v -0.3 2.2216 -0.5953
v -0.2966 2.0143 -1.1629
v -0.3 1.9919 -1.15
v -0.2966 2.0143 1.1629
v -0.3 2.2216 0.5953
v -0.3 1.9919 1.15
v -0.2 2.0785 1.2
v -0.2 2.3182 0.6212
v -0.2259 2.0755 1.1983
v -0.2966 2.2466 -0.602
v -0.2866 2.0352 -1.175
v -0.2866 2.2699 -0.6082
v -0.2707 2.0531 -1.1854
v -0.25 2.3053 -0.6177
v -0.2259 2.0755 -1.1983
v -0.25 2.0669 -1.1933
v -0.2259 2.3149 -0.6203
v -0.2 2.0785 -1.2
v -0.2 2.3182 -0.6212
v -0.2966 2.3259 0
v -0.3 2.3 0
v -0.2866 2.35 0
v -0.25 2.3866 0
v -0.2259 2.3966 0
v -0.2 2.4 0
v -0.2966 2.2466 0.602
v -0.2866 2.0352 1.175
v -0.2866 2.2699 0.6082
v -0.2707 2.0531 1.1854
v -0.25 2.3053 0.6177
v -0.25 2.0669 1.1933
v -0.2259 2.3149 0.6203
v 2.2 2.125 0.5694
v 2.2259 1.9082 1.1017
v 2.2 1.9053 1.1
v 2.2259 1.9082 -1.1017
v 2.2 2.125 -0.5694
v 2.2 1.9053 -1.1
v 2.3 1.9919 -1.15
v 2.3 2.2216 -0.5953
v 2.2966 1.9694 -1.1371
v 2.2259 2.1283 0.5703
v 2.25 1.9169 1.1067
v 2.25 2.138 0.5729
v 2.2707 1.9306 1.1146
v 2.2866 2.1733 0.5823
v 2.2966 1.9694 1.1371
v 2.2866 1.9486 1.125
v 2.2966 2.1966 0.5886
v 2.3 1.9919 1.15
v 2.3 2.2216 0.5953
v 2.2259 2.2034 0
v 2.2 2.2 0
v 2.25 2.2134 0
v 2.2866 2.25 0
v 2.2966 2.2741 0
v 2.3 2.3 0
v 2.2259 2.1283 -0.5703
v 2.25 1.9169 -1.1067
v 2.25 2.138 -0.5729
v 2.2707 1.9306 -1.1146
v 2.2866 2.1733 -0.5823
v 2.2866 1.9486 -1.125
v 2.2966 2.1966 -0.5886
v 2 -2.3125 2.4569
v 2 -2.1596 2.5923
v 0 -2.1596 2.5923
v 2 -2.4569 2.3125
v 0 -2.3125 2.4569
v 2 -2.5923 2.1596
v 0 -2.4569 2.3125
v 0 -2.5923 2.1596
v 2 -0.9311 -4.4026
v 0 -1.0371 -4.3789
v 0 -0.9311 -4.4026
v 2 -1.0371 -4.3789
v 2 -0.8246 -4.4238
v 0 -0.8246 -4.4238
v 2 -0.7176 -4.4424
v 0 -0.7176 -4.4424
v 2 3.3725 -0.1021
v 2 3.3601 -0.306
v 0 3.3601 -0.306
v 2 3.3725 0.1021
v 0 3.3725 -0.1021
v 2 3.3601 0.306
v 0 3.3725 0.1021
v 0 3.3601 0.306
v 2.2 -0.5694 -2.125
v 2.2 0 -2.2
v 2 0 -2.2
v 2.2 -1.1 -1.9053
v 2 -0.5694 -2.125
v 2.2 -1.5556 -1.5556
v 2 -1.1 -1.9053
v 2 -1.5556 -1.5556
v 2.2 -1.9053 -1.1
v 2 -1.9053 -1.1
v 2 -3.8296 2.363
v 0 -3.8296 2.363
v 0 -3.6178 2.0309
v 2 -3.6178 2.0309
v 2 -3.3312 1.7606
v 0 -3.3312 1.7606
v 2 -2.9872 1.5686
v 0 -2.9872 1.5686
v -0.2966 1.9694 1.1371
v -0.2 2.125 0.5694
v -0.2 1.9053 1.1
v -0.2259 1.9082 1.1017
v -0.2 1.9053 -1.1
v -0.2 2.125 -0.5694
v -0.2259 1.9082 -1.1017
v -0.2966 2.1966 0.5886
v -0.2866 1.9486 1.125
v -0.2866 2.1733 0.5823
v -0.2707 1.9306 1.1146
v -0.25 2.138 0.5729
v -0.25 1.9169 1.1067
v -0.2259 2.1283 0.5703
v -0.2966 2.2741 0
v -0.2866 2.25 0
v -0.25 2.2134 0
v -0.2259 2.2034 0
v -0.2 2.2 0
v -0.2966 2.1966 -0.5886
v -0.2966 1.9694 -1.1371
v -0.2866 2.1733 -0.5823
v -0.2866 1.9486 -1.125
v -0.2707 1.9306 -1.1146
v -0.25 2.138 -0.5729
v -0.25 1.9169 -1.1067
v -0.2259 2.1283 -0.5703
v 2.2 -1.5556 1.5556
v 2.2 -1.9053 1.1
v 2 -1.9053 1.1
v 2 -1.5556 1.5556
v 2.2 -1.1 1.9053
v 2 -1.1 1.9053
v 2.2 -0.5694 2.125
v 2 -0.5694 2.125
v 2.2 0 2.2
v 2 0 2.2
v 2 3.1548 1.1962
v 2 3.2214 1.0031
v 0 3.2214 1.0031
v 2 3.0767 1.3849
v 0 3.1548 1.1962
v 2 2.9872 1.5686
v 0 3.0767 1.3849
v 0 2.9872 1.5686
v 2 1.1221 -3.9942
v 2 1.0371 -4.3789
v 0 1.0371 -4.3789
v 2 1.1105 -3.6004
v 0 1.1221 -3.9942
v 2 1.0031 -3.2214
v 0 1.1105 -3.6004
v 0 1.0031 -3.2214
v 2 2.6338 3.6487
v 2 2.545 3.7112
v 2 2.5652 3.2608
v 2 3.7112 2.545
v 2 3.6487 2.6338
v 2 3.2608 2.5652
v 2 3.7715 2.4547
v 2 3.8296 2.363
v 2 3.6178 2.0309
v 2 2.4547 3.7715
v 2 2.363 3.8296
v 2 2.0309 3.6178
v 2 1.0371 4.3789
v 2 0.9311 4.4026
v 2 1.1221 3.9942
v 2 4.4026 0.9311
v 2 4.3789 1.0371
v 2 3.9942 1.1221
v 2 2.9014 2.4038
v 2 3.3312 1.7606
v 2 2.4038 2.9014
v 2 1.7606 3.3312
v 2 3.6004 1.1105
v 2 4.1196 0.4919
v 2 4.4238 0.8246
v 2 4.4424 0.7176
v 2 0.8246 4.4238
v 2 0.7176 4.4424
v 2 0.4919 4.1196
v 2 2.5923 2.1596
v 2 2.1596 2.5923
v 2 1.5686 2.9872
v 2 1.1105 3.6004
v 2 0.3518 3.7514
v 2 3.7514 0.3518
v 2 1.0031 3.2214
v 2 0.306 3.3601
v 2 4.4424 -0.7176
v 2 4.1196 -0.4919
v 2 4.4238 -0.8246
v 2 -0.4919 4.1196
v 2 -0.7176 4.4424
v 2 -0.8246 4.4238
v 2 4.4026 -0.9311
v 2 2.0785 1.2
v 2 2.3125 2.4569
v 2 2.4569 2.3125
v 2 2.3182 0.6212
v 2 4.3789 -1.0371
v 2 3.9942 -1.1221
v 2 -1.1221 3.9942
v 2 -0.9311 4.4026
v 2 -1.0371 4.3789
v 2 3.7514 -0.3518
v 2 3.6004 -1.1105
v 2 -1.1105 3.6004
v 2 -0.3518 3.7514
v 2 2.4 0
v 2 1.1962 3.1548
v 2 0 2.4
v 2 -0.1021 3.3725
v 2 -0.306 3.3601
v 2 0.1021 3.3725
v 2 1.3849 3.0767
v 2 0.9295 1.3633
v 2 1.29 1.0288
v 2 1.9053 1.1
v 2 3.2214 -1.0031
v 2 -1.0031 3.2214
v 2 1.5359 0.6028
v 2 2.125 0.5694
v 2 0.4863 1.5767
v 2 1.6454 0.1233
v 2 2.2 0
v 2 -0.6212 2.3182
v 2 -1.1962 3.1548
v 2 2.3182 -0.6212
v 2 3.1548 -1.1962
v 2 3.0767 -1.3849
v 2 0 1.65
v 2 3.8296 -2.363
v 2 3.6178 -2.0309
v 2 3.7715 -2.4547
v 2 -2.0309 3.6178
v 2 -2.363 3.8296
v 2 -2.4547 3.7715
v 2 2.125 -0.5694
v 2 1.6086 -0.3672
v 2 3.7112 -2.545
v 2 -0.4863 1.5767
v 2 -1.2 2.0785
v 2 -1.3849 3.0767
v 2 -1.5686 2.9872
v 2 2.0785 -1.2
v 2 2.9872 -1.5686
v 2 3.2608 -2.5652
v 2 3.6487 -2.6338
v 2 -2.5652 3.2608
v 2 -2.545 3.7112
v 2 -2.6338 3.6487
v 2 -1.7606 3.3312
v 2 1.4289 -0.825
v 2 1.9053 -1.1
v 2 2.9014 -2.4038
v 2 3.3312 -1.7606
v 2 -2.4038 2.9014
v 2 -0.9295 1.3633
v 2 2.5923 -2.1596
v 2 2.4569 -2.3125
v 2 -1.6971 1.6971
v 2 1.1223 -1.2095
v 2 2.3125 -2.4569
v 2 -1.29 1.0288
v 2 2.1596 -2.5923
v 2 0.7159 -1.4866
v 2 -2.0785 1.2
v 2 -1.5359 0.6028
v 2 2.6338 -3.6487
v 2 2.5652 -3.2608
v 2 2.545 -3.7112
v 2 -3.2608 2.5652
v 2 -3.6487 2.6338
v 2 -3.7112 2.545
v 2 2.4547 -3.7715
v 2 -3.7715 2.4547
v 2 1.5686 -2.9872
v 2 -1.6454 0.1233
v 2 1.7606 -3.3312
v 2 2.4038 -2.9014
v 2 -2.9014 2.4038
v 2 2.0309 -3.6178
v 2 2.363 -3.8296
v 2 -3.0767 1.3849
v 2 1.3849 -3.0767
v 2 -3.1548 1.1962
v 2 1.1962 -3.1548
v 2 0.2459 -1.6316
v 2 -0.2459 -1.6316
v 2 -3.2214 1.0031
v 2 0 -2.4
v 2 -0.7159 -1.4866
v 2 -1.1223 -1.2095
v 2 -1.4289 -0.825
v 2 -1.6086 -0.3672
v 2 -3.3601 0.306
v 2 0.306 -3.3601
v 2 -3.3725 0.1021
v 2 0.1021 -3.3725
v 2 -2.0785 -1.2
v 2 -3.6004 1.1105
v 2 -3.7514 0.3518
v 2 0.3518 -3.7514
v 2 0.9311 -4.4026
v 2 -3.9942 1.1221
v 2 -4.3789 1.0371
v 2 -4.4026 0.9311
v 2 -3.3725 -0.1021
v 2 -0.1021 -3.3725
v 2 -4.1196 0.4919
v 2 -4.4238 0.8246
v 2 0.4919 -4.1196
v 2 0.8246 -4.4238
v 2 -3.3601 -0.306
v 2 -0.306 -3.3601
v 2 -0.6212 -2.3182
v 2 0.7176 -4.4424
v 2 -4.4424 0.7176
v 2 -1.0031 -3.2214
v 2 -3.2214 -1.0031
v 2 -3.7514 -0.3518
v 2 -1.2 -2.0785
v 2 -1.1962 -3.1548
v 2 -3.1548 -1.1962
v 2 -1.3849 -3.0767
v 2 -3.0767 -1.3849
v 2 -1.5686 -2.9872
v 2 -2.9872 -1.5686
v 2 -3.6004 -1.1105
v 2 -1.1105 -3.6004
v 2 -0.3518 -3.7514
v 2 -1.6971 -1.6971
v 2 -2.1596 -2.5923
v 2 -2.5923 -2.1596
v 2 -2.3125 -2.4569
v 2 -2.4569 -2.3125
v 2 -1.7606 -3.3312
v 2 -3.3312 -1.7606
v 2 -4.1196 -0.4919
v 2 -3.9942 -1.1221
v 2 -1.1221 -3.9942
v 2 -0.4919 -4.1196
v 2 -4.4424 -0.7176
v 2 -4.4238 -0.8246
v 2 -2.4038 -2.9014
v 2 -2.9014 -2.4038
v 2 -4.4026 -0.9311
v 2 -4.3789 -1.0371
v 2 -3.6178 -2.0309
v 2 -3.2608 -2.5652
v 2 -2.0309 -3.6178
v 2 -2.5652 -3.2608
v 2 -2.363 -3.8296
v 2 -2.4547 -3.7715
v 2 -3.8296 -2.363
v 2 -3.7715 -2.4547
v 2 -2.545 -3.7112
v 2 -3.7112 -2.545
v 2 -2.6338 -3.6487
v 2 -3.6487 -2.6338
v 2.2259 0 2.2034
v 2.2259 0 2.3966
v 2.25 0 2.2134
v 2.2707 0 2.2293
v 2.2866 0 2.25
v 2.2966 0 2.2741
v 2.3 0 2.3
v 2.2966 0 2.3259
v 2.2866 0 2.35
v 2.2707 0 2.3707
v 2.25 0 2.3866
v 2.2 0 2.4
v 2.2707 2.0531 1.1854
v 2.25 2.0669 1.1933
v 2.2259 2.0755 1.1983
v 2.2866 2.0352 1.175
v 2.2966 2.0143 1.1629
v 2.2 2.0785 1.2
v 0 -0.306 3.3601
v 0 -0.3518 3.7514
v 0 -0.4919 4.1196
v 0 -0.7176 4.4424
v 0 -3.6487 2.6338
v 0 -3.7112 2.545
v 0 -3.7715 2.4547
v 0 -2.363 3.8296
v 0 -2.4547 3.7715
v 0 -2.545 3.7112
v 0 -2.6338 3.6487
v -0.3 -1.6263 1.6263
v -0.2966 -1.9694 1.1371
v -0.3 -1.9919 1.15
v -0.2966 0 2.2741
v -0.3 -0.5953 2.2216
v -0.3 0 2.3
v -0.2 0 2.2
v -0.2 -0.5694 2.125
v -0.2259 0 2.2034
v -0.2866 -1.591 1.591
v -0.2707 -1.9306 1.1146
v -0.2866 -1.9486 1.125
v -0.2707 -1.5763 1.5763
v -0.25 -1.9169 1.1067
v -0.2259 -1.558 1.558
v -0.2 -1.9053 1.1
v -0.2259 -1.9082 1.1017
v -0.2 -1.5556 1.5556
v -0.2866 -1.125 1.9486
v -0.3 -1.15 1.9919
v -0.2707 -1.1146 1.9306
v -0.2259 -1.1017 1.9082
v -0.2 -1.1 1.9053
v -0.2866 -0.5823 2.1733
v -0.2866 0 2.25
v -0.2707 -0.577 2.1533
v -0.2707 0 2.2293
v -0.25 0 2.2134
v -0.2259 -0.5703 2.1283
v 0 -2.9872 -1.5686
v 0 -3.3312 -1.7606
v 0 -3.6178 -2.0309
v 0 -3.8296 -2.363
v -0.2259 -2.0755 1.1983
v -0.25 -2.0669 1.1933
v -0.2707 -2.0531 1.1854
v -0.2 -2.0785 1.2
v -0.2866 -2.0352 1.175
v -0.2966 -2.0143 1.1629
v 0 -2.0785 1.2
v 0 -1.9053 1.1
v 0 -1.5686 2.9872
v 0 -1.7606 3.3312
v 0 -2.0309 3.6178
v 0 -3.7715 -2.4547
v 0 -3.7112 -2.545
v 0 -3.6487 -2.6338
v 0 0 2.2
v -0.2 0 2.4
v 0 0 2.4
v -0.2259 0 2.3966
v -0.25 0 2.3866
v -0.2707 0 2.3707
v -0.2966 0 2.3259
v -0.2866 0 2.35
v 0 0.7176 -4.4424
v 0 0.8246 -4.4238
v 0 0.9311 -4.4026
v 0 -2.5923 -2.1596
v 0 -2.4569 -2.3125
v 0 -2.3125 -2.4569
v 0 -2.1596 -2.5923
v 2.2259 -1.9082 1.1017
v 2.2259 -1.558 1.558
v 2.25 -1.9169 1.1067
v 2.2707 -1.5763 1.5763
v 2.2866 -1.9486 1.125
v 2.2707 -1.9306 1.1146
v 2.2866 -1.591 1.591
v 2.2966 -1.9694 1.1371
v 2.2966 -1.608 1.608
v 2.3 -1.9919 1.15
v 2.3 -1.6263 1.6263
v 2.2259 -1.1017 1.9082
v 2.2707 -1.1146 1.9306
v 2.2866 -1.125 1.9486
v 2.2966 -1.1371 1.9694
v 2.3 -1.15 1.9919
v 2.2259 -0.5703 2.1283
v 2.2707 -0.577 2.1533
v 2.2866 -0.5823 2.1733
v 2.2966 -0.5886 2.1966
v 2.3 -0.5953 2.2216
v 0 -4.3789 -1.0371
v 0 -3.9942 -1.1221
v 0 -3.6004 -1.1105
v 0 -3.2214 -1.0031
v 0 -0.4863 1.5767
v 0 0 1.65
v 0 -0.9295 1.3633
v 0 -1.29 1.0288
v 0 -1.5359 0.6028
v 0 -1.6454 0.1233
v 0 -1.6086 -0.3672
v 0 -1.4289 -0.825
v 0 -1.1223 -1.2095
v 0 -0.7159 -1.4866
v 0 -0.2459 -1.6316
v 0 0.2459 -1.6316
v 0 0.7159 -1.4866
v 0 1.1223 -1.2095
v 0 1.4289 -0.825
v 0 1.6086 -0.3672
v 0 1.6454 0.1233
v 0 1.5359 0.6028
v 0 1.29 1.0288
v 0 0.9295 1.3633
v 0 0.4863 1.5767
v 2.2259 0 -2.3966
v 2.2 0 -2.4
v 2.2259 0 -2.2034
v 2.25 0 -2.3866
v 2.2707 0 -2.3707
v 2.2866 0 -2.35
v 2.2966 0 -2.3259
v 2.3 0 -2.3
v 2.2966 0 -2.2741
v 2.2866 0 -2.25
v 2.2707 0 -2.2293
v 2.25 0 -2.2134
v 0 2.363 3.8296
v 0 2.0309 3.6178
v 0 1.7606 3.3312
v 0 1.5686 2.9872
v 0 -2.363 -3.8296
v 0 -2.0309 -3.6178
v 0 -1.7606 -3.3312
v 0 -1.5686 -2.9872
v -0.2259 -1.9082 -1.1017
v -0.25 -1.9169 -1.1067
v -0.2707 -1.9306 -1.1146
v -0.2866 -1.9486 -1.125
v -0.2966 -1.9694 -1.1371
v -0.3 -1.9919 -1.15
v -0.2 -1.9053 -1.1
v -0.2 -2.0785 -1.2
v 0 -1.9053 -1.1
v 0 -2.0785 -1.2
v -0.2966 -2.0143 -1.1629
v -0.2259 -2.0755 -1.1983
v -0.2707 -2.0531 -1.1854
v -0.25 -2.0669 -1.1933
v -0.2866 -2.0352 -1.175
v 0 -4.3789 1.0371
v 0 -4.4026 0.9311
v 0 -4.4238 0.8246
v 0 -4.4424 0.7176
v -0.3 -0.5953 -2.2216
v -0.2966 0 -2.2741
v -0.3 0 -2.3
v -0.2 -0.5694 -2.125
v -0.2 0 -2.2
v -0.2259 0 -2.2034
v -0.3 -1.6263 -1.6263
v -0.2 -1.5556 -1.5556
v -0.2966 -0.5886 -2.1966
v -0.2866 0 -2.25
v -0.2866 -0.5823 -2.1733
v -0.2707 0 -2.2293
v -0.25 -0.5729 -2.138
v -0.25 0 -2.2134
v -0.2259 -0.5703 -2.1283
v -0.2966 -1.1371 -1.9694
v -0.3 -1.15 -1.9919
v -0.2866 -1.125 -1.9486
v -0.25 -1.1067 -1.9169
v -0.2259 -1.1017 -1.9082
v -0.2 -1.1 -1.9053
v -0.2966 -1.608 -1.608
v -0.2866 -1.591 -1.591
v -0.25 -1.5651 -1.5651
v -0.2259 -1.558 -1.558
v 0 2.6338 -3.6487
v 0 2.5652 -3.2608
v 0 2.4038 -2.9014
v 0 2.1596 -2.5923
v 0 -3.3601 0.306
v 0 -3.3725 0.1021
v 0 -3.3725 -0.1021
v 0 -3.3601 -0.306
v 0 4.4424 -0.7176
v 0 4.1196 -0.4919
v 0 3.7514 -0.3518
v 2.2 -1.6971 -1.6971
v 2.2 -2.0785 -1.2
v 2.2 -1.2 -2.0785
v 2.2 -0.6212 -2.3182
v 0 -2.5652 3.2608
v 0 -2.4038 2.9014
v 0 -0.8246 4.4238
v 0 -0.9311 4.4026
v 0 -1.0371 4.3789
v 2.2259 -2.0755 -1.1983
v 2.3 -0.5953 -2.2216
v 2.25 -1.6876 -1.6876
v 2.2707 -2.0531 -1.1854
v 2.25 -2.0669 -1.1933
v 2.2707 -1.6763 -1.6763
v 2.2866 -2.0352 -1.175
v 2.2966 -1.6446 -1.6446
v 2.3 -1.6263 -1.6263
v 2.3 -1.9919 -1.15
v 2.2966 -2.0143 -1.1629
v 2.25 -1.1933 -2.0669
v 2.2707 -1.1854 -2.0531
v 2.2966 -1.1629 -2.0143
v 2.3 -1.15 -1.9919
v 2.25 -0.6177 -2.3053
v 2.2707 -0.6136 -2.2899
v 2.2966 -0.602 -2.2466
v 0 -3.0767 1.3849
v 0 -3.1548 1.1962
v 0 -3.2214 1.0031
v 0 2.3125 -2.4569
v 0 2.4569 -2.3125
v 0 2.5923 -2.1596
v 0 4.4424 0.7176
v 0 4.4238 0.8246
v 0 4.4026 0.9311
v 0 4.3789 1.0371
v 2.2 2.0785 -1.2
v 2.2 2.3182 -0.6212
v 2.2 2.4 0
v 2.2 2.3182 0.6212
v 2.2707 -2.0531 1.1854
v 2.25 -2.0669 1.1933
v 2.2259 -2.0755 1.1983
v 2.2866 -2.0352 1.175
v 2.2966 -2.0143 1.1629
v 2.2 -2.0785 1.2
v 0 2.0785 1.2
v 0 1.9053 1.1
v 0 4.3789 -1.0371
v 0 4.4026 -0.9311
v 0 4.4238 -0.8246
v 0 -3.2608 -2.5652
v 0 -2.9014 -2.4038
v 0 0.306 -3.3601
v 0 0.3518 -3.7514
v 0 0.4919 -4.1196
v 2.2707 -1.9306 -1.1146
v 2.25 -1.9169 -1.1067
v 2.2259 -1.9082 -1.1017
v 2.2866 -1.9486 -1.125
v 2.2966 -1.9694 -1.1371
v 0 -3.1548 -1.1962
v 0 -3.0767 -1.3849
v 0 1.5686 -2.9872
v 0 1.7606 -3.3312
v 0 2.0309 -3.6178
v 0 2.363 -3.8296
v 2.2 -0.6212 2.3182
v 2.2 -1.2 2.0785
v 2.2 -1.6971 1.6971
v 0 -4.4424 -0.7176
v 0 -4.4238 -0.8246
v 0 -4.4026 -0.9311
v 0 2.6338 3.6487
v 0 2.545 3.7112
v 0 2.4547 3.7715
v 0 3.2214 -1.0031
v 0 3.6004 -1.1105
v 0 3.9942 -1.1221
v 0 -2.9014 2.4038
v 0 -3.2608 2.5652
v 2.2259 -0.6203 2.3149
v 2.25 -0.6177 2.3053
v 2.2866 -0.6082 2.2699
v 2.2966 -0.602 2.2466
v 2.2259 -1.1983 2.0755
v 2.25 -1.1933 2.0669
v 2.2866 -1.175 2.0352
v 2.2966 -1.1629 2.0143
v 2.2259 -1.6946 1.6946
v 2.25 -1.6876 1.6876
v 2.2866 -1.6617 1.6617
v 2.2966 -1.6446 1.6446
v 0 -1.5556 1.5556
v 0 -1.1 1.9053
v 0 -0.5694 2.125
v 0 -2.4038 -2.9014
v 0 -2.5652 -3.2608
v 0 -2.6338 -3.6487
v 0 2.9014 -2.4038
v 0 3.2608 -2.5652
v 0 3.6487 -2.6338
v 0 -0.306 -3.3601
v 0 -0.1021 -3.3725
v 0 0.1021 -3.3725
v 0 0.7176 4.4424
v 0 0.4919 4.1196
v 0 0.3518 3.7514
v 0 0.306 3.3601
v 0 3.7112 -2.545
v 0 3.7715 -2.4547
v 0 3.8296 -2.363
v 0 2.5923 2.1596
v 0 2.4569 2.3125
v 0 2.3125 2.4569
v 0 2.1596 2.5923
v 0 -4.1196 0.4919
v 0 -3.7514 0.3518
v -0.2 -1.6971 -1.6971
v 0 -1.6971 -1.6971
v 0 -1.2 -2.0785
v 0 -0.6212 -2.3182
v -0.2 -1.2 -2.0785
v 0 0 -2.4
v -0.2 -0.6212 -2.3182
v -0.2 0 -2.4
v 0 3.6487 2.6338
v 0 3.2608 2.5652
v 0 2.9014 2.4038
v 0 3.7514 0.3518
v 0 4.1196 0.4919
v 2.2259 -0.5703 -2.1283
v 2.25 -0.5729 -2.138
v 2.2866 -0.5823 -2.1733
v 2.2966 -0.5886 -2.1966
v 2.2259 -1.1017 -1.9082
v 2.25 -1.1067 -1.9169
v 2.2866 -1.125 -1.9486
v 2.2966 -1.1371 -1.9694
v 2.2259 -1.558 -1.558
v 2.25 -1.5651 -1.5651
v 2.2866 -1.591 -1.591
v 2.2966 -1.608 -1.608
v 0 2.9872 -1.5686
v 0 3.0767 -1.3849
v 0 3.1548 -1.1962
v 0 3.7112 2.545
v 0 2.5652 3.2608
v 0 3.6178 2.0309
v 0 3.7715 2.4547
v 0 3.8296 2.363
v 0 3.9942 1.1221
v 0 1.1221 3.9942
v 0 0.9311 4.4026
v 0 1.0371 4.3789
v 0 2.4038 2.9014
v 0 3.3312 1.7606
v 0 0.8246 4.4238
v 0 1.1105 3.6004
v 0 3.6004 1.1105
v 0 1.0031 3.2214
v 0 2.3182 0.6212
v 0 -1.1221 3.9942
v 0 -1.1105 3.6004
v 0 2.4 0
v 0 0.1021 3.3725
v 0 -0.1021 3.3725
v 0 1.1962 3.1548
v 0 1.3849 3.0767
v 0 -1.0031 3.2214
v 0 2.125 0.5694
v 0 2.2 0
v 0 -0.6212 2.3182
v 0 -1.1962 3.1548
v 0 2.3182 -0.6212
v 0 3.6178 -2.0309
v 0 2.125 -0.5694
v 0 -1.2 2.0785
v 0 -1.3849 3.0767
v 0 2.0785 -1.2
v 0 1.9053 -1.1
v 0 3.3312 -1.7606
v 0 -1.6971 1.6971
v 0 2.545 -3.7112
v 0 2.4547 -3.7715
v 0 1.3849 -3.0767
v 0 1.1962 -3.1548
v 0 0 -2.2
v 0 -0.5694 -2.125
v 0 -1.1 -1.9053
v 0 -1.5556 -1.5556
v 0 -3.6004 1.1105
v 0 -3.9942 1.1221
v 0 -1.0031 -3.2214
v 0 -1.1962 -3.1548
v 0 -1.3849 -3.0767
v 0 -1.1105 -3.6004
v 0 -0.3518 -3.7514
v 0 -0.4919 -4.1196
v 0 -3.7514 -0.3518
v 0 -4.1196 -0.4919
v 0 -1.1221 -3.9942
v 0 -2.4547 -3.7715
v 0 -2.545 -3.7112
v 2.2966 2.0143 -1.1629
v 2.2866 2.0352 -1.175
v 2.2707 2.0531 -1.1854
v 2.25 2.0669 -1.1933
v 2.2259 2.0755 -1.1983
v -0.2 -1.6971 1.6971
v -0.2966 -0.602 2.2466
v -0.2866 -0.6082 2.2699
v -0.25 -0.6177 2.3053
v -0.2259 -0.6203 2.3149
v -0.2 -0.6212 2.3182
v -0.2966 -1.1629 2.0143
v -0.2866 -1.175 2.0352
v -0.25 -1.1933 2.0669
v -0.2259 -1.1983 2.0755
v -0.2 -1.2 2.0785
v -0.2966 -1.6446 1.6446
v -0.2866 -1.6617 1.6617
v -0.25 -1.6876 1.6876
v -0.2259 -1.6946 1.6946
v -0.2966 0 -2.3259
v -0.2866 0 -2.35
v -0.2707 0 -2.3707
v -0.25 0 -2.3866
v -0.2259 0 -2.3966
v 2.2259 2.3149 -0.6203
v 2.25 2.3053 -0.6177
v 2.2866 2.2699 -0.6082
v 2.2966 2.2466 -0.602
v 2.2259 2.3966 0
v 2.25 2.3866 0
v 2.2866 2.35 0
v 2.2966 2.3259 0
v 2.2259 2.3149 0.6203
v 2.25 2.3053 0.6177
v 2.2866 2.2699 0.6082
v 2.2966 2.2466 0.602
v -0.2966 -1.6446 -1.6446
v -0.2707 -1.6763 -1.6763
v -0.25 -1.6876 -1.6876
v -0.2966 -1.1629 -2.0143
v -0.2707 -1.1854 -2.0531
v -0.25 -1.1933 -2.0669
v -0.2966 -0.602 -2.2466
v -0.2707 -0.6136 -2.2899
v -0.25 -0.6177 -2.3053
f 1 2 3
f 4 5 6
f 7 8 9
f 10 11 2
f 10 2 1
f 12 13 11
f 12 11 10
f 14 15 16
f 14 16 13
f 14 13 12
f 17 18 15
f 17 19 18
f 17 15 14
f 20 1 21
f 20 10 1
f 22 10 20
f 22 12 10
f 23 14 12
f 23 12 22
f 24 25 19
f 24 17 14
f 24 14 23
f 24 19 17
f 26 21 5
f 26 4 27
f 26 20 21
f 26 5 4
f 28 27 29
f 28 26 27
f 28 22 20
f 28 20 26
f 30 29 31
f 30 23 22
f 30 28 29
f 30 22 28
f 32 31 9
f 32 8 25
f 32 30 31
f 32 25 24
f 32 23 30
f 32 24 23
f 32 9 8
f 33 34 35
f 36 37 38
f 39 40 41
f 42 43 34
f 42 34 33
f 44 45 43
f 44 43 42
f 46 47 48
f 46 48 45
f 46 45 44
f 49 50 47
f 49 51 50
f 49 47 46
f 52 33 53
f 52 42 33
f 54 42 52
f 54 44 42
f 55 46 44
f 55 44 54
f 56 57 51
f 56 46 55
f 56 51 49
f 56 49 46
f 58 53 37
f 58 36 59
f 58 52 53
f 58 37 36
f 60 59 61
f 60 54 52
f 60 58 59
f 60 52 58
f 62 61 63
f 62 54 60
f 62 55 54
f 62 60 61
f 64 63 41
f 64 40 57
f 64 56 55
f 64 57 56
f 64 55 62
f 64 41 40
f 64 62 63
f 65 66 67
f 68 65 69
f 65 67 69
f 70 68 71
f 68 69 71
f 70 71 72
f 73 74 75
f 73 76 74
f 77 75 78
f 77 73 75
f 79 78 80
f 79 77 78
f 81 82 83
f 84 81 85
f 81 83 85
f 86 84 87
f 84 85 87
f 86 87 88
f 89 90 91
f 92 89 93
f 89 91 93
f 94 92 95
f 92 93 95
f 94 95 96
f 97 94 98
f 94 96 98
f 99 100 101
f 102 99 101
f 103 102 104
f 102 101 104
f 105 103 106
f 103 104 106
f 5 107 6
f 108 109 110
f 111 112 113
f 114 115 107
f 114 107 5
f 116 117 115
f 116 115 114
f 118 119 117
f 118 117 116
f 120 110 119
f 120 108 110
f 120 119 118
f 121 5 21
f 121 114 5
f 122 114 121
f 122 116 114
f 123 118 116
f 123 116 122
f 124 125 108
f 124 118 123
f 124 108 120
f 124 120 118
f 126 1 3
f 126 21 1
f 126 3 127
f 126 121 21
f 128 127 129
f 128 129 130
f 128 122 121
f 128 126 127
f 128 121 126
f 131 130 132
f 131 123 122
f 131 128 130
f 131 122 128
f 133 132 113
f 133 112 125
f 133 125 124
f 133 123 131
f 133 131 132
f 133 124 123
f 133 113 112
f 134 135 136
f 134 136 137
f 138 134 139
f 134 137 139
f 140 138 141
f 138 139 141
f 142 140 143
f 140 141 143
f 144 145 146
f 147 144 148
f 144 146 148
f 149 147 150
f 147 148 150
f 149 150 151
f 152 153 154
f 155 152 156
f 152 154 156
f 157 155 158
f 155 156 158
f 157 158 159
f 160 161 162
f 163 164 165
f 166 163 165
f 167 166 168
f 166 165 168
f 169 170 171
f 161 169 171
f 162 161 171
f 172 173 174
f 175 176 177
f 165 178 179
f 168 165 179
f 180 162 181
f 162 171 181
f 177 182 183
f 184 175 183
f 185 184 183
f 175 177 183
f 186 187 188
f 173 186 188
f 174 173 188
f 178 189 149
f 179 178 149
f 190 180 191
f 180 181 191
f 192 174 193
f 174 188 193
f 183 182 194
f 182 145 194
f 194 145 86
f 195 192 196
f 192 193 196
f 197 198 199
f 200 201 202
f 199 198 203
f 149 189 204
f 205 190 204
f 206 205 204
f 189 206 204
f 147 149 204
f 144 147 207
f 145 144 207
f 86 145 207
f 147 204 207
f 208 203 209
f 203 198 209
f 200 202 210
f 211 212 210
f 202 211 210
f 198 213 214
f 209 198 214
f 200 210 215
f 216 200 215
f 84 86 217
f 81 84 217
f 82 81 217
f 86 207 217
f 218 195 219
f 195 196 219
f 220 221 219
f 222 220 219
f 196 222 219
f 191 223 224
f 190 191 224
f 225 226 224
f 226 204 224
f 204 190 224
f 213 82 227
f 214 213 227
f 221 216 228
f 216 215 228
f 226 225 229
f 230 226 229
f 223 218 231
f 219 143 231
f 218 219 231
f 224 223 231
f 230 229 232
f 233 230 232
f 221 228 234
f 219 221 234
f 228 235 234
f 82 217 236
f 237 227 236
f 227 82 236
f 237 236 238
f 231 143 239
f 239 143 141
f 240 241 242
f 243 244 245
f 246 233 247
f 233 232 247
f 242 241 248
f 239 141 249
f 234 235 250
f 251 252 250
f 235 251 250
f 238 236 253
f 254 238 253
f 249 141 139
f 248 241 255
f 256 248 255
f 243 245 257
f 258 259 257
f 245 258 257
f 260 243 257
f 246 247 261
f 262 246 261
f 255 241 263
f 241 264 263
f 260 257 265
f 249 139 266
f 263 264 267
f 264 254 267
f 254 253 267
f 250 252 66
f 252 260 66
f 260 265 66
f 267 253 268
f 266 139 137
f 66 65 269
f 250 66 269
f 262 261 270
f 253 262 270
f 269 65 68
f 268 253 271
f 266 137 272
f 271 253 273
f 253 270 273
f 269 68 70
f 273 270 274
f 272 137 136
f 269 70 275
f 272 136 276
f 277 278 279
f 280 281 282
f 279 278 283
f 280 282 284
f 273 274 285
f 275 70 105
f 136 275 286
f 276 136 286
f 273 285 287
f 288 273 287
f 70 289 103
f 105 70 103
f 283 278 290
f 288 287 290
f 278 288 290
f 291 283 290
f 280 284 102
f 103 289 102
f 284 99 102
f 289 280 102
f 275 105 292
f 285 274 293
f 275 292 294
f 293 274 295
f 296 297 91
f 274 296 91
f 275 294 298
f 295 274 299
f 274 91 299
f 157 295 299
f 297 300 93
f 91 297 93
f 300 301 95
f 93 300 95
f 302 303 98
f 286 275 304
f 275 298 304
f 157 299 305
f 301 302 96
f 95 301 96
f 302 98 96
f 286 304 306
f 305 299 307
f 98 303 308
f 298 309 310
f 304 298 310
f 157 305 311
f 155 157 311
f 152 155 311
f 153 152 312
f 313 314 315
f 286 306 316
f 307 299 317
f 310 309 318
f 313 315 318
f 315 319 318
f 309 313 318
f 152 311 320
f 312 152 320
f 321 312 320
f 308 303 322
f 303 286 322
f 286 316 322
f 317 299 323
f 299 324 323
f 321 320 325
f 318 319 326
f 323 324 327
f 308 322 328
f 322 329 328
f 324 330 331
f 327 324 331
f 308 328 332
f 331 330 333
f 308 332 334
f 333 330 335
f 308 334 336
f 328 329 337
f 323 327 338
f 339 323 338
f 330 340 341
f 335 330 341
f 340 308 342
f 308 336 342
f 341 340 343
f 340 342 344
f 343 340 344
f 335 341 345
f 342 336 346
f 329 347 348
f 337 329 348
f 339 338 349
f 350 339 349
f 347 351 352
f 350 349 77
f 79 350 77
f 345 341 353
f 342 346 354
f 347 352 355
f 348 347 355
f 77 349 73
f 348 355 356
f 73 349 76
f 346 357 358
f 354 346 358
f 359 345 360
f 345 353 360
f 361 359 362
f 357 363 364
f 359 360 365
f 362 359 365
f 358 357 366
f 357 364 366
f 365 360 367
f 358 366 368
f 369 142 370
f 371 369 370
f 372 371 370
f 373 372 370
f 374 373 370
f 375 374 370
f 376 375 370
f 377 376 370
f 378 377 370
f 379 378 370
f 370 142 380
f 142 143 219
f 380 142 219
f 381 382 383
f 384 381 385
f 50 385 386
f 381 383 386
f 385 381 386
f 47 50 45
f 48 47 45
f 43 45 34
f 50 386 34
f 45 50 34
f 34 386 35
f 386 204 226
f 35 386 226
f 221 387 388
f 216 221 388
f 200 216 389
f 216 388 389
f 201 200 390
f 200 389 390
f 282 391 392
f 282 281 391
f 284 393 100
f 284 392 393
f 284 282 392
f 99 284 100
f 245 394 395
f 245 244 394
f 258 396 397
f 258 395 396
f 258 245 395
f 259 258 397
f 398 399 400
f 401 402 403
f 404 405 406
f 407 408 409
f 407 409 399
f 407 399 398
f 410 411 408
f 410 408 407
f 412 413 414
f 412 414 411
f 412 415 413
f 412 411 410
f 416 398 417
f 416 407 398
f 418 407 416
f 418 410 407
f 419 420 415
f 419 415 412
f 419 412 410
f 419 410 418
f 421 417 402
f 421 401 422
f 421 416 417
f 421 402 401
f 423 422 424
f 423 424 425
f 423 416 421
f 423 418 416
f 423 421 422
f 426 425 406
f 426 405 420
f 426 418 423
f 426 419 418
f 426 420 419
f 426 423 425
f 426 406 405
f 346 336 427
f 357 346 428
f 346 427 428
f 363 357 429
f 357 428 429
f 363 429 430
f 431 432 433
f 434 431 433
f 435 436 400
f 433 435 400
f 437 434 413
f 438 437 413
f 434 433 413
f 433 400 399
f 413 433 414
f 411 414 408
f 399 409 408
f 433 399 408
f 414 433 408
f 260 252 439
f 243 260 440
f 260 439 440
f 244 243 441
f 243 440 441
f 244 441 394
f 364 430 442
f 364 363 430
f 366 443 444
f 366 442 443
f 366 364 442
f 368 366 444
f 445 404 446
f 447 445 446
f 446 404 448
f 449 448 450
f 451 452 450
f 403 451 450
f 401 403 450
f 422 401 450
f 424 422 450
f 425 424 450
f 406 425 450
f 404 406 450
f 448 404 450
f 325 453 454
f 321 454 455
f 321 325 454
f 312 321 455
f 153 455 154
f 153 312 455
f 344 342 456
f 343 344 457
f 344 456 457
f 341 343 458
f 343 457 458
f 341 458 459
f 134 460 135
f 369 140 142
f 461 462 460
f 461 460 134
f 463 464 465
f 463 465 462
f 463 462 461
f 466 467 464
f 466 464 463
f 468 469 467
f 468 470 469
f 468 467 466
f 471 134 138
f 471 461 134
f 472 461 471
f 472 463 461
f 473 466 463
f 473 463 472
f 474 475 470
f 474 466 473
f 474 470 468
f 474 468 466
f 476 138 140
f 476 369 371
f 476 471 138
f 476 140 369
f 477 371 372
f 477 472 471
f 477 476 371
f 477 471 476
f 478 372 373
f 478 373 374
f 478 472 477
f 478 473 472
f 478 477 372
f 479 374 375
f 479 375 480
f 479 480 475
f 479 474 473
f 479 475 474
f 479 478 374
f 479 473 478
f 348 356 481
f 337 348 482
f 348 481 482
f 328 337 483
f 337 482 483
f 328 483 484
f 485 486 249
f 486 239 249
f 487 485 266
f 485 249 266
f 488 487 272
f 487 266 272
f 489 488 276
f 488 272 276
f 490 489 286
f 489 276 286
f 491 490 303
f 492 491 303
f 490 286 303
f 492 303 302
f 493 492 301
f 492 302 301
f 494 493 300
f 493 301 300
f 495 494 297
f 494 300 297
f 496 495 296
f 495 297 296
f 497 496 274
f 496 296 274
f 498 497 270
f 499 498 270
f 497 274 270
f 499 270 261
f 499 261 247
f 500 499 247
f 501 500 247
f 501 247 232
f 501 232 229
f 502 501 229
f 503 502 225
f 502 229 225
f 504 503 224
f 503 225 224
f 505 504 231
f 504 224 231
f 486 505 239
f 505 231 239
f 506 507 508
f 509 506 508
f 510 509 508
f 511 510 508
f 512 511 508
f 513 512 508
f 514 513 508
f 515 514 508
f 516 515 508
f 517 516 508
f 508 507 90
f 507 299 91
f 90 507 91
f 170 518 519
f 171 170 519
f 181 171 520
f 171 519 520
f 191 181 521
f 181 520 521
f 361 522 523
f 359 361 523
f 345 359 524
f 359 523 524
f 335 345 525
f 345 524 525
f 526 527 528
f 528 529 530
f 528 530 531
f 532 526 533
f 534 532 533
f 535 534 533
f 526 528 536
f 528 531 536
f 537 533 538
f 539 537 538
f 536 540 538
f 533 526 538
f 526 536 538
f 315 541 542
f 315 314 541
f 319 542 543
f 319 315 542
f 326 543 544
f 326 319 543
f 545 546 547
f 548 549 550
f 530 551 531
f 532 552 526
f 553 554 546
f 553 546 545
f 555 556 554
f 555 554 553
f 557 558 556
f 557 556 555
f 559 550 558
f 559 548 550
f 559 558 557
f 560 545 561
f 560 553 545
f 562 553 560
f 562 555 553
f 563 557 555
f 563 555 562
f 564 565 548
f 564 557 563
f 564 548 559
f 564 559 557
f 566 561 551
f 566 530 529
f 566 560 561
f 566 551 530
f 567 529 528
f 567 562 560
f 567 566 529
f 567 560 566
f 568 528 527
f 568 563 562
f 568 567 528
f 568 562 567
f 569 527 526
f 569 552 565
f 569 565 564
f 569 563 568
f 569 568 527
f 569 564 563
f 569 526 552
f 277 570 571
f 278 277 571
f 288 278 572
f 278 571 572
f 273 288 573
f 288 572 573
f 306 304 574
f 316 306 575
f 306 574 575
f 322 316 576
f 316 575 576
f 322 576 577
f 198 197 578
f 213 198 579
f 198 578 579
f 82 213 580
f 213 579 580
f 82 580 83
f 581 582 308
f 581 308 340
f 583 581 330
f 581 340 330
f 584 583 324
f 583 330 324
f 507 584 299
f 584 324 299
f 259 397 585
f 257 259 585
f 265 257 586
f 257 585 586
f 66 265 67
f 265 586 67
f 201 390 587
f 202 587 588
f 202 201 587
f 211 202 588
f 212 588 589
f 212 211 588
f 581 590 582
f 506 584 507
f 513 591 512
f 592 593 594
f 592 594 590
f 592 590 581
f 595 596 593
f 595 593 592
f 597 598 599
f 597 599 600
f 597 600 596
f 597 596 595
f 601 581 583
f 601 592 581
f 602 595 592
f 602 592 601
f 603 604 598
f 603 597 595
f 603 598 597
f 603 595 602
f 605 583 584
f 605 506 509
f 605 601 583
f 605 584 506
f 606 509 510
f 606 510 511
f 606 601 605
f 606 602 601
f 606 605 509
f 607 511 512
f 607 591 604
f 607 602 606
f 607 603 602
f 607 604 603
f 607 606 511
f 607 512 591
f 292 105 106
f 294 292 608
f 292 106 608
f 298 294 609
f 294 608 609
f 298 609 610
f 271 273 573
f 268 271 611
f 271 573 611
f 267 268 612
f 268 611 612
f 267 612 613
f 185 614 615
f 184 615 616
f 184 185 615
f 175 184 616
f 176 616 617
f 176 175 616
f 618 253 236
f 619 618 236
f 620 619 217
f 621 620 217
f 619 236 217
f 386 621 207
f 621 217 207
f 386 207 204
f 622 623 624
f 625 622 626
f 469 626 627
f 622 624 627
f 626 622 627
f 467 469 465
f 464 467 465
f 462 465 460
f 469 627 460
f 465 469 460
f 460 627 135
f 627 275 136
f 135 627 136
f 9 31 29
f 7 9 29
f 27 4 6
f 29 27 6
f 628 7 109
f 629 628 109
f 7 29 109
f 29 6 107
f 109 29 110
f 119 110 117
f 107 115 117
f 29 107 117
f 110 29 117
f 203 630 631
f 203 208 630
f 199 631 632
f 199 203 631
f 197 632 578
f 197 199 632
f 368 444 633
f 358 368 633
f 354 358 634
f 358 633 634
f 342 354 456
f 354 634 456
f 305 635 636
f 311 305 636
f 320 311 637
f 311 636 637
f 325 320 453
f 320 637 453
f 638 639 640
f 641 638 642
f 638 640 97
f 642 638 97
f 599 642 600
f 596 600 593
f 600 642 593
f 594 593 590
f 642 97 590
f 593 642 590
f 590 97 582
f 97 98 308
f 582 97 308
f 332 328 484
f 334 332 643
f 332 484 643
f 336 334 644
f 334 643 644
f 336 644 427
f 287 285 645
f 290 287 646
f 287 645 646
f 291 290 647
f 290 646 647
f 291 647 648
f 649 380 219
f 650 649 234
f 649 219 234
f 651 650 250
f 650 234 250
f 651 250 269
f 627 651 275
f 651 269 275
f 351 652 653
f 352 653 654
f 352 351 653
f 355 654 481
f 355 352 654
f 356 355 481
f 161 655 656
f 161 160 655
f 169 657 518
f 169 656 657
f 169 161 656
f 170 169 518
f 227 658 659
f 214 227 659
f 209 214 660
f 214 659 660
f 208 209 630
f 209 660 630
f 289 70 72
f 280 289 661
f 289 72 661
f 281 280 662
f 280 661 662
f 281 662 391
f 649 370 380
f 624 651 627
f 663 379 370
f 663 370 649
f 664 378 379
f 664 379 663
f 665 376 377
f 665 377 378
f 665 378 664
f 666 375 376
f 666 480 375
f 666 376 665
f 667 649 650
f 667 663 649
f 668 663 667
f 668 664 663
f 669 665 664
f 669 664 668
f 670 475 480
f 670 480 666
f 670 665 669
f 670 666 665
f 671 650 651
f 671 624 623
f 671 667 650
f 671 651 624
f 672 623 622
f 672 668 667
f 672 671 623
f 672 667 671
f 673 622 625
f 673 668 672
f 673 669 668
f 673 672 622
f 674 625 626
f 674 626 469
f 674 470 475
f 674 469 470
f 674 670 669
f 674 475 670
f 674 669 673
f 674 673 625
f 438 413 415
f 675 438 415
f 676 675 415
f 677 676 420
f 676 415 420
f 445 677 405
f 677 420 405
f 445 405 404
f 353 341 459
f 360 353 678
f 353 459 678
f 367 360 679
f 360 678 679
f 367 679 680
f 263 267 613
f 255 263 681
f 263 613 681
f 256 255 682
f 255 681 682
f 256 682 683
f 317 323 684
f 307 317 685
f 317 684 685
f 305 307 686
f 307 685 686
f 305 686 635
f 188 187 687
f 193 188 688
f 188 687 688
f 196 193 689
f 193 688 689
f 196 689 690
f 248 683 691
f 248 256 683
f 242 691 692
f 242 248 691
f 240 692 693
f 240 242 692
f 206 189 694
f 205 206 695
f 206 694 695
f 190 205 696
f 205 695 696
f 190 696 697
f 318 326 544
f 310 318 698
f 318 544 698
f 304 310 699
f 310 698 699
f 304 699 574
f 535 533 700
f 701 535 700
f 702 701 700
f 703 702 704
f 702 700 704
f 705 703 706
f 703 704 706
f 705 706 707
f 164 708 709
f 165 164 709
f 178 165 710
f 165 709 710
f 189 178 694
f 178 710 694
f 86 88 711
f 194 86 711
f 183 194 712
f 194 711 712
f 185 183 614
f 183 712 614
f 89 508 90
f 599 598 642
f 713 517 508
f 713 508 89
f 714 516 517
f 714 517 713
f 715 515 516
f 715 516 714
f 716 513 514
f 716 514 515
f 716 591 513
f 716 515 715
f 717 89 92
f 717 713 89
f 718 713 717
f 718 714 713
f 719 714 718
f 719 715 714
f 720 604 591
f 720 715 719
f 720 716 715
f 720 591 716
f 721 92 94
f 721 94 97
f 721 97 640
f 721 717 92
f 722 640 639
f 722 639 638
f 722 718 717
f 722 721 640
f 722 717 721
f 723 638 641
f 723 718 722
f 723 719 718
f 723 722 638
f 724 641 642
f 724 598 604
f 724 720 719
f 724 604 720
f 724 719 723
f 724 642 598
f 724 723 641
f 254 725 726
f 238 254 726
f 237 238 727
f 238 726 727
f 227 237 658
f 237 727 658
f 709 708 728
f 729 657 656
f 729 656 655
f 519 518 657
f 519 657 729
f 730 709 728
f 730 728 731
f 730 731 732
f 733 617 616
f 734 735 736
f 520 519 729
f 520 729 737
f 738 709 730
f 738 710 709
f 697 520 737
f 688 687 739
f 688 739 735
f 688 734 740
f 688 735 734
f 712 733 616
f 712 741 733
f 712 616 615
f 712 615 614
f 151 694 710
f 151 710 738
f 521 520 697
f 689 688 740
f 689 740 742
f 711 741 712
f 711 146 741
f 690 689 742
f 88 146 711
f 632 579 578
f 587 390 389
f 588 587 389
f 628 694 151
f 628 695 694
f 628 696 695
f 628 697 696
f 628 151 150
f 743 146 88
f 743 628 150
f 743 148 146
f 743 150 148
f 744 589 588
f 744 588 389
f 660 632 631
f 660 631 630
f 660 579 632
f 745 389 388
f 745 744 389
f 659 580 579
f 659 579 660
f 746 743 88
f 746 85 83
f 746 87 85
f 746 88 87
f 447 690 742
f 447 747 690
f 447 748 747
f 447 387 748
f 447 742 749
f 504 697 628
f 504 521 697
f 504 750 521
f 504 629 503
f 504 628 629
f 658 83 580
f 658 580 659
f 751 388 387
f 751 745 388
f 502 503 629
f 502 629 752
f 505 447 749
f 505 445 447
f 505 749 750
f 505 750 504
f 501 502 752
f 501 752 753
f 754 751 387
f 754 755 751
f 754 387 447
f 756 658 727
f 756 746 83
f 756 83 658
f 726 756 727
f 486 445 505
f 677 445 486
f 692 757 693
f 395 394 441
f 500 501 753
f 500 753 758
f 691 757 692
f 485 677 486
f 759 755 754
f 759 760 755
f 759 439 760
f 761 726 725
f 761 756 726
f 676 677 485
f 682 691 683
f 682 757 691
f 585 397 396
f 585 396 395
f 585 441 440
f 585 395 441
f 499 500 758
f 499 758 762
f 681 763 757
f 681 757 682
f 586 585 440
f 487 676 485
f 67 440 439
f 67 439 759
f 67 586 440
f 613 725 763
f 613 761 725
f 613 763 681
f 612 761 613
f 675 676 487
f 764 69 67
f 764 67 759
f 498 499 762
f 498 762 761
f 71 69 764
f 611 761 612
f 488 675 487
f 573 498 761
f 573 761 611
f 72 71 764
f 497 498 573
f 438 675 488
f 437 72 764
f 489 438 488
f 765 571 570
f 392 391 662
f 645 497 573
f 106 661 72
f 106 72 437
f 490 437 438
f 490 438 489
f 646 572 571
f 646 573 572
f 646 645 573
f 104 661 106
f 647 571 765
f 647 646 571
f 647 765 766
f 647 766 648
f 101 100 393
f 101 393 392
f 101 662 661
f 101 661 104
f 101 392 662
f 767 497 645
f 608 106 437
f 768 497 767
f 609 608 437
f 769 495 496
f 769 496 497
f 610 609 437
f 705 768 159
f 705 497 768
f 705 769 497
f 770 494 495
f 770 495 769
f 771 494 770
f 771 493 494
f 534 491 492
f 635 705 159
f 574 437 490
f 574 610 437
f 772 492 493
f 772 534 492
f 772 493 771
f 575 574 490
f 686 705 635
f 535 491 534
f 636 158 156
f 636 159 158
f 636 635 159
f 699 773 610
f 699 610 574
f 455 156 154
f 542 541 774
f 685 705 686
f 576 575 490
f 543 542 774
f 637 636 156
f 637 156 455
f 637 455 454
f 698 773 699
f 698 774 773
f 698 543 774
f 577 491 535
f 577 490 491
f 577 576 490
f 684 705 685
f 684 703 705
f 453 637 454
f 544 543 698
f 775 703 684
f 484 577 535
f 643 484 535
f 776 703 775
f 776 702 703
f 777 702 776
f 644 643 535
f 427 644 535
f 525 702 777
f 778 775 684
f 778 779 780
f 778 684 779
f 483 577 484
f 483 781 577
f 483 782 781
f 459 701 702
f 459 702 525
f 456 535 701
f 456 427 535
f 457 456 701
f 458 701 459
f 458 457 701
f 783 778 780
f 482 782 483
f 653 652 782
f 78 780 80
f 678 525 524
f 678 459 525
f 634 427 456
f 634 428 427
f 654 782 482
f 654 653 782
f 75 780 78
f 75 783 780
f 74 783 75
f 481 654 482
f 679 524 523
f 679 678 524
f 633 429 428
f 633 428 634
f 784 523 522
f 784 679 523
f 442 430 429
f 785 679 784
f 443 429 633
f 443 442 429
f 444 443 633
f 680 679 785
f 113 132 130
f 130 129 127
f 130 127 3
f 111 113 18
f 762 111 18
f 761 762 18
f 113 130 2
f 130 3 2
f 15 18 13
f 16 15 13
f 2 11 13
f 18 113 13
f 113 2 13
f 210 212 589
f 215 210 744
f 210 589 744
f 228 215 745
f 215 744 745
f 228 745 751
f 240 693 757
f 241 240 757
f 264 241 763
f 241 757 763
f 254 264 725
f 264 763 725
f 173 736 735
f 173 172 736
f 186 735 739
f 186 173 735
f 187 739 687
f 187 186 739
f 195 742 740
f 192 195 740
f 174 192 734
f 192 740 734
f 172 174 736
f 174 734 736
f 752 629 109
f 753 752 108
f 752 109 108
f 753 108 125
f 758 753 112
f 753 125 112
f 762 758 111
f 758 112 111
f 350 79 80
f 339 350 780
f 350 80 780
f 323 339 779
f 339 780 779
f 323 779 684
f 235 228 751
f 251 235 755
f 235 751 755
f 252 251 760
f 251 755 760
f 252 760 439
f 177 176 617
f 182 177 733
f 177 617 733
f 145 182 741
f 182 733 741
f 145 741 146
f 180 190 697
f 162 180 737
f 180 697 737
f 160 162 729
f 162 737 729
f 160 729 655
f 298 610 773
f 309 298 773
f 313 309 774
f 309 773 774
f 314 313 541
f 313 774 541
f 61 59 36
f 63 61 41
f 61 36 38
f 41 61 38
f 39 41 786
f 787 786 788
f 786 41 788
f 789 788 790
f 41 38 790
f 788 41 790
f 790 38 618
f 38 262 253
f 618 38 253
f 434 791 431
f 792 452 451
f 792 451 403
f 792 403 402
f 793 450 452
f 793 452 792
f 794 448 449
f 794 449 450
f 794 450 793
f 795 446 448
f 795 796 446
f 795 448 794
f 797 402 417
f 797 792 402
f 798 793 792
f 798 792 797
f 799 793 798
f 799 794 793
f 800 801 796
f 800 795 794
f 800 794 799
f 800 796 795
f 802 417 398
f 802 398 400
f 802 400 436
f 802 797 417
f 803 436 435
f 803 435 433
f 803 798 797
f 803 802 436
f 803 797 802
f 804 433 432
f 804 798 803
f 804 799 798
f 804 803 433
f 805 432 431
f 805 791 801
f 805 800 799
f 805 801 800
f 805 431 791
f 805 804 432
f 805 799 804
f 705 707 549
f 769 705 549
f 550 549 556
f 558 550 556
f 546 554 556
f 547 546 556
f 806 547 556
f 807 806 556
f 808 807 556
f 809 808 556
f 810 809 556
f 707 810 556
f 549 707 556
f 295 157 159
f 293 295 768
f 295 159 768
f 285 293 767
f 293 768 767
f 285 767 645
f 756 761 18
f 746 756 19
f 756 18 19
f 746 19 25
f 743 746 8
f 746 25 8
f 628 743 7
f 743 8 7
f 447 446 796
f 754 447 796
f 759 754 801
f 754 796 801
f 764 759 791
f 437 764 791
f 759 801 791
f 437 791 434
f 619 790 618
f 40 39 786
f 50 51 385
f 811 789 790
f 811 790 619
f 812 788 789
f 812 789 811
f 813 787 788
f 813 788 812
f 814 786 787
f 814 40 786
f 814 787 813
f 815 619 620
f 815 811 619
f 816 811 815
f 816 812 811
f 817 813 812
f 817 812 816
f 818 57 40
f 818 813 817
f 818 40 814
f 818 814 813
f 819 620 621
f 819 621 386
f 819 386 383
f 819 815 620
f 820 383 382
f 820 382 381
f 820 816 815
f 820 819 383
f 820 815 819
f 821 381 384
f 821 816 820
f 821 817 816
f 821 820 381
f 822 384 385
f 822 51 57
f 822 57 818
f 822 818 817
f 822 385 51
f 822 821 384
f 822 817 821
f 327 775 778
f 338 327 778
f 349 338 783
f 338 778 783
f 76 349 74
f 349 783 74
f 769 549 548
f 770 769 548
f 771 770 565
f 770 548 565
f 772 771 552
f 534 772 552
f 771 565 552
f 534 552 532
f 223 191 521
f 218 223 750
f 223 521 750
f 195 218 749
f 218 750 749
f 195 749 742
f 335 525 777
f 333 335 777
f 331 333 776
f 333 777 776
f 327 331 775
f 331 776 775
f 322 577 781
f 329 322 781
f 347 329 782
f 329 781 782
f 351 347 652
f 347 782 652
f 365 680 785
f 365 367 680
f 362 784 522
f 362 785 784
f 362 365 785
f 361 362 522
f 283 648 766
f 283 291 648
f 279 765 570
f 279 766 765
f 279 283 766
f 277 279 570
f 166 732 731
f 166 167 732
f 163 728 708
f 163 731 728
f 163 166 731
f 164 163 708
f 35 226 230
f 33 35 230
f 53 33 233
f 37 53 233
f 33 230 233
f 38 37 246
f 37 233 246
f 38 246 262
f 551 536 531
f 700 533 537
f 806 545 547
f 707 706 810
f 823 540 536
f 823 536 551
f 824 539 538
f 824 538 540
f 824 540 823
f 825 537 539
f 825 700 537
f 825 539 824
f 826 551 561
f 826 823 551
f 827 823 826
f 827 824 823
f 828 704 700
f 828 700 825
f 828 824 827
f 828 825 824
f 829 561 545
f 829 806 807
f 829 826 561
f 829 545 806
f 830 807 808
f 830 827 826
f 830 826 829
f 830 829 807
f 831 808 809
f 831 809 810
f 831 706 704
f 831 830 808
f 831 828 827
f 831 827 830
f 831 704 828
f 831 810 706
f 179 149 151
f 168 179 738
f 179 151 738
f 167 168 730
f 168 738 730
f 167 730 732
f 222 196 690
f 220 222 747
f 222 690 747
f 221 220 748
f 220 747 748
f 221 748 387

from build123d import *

# Parameters (mm, degrees)
BASPROSKE_W     = 2
BASPROSKE_H     = 4.5
TOOTHCUT_DEPTH  = 7.670832032
TEETHCUTS_COUNT = 16
TEETHCUTS_ANGLE = 337.5
BORSKE_R        = 1.65
BORE_DEPTH      = 50.0000508
EXTRUDE_2_DEPTH = 0.3
FILLET_4_R      = 0.1
FILLET_5_R      = 0.1
FILLET_6_R      = 0.1
EXTRUDE_START   = -2.3
EXTRUDE_5_DEPTH = 0.3
FILLET_7_R      = 0.1
FILLET_8_R      = 0.1
FILLET_9_R      = 0.1


with BuildPart() as part:
    # BasProSke → Base-Revolve (revolve)
    with BuildSketch(Plane(origin=(0, 0, 0), x_dir=(1, 0, 0), z_dir=(0, 1, 0)), mode=Mode.PRIVATE) as base_revolve_sk:
        with Locations((1, 2.25)):
            Rectangle(BASPROSKE_W, BASPROSKE_H)
    revolve(base_revolve_sk.sketch.rotate(Axis((-10, 0, 0), (1, 0, 0)), 180), axis=Axis((-10, 0, 0), (1, 0, 0)))

    # TooCutSke → ToothCut (cut, through all)
    with BuildSketch(Plane(origin=(0, 0, 0), x_dir=(0, 0, -1), z_dir=(1, 0, 0))):
        with BuildLine():
            ThreePointArc((0.306025637, 3.360092902), (0, 3.374), (-0.306025637, 3.360092902))
            ThreePointArc((-0.306025637, 3.360092902), (-0.415941512, 3.953968919), (-0.738171669, 4.464789776))
            ThreePointArc((-0.738171669, 4.464789776), (0, 4.5254), (0.738171669, 4.464789776))
            ThreePointArc((0.738171669, 4.464789776), (0.415941512, 3.953968919), (0.306025637, 3.360092902))
        make_face()
    toothcut = extrude(amount=TOOTHCUT_DEPTH, mode=Mode.SUBTRACT)

    # TeethCuts: ToothCut ×16 about axis
    teethcuts_axis = Axis((-10, 0, 0), (1, 0, 0))
    for i in range(1, TEETHCUTS_COUNT):
        add(toothcut.rotate(teethcuts_axis, i * TEETHCUTS_ANGLE / (TEETHCUTS_COUNT - 1)), mode=Mode.SUBTRACT)

    # BorSke → Bore (cut, symmetric)
    with BuildSketch(Plane(origin=(0, 0, 0), x_dir=(0, 0, -1), z_dir=(1, 0, 0))):
        with Locations(Location((0, 0, 0), (0, 0, 180))):
            Circle(BORSKE_R)
    extrude(amount=BORE_DEPTH, both=True, mode=Mode.SUBTRACT)

    # 草图1 → 拉伸-薄壁2 (add)
    with BuildSketch(Plane(origin=(2, 0, 0), x_dir=(0, 0, -1), z_dir=(1, 0, 0))):
        with BuildLine():
            ThreePointArc((-1.1, 1.905255888), (0, 2.2), (1.1, 1.905255888))
            Line((1.1, 1.905255888), (1.2, 2.078460969))
            ThreePointArc((1.2, 2.078460969), (0, 2.4), (-1.2, 2.078460969))
            Line((-1.2, 2.078460969), (-1.1, 1.905255888))
        make_face()
        with BuildLine():
            ThreePointArc((2.2, 0), (1.905255888, -1.1), (1.1, -1.905255888))
            Line((1.1, -1.905255888), (1.2, -2.078460969))
            ThreePointArc((1.2, -2.078460969), (2.078460969, -1.2), (2.4, 0))
            Line((2.4, 0), (2.2, 0))
        make_face()
        with BuildLine():
            ThreePointArc((-1.1, -1.905255888), (-1.905255888, -1.1), (-2.2, 0))
            Line((-2.2, 0), (-2.4, 0))
            ThreePointArc((-2.4, 0), (-2.078460969, -1.2), (-1.2, -2.078460969))
            Line((-1.2, -2.078460969), (-1.1, -1.905255888))
        make_face()
    extrude(amount=EXTRUDE_2_DEPTH)

    # 圆角4
    # the kernel refuses this fillet: 0.1 mm, written as the material it takes off along each edge
    with BuildSketch(Plane(origin=(2.3, 0, 0), x_dir=(0, 0.10399688261682524, 0.994577623117463), z_dir=(0, 0.994577623117463, -0.10399688261682524))) as fillet_4_piece_1:
        with BuildLine():
            CenterArc((2.4 - FILLET_4_R, -FILLET_4_R), FILLET_4_R, 0, 90)
            Line((2.4 - FILLET_4_R, 0), (2.4, 0))
            Line((2.4, 0), (2.4, -FILLET_4_R))
        make_face()
    revolve(axis=Axis((2.3, 0, 0), (1, 0, 0)), revolution_arc=71.938751527, mode=Mode.SUBTRACT)
    with BuildSketch(Plane(origin=(2.3, 0, 0), x_dir=(0, -0.9171438900620574, 0.39855625063701683), z_dir=(0, -0.39855625063701683, -0.9171438900620574))) as fillet_4_piece_2:
        with BuildLine():
            CenterArc((2.2 + FILLET_4_R, FILLET_4_R), FILLET_4_R, 180, 90)
            Line((2.2 + FILLET_4_R, 0), (2.2, 0))
            Line((2.2, 0), (2.2, FILLET_4_R))
        make_face()
    revolve(axis=Axis((2.3, 0, 0), (-1, 0, 0)), revolution_arc=73.024092575, mode=Mode.SUBTRACT)

    # 圆角5
    # the kernel refuses this fillet: 0.1 mm, written as the material it takes off along each edge
    with BuildSketch(Plane(origin=(2.3, 0, 0), x_dir=(0, 0.809331046346937, -0.5873527538191783), z_dir=(0, -0.5873527538191783, -0.809331046346937))) as fillet_5_piece_1:
        with BuildLine():
            CenterArc((2.4 - FILLET_5_R, -FILLET_5_R), FILLET_5_R, 0, 90)
            Line((2.4 - FILLET_5_R, 0), (2.4, 0))
            Line((2.4, 0), (2.4, -FILLET_5_R))
        make_face()
    revolve(axis=Axis((2.3, 0, 0), (1, 0, 0)), revolution_arc=71.938751527, mode=Mode.SUBTRACT)
    with BuildSketch(Plane(origin=(2.3, 0, 0), x_dir=(0, 0.8037317829196821, 0.5949917824010252), z_dir=(0, -0.5949917824010252, 0.8037317829196821))) as fillet_5_piece_2:
        with BuildLine():
            CenterArc((2.2 + FILLET_5_R, FILLET_5_R), FILLET_5_R, 180, 90)
            Line((2.2 + FILLET_5_R, 0), (2.2, 0))
            Line((2.2, 0), (2.2, FILLET_5_R))
        make_face()
    revolve(axis=Axis((2.3, 0, 0), (-1, 0, 0)), revolution_arc=73.024092575, mode=Mode.SUBTRACT)

    # 圆角6
    # the kernel refuses this fillet: 0.1 mm, written as the material it takes off along each edge
    with BuildSketch(Plane(origin=(2.3, 0, 0), x_dir=(0, -0.9133279289636526, -0.4072248692982359), z_dir=(0, -0.4072248692982359, 0.9133279289636526))) as fillet_6_piece_1:
        with BuildLine():
            CenterArc((2.4 - FILLET_6_R, -FILLET_6_R), FILLET_6_R, 0, 90)
            Line((2.4 - FILLET_6_R, 0), (2.4, 0))
            Line((2.4, 0), (2.4, -FILLET_6_R))
        make_face()
    revolve(axis=Axis((2.3, 0, 0), (1, 0, 0)), revolution_arc=71.938751527, mode=Mode.SUBTRACT)
    with BuildSketch(Plane(origin=(2.3, 0, 0), x_dir=(0, 0.11341210714236213, -0.9935480330379249), z_dir=(0, 0.9935480330379249, 0.11341210714236213))) as fillet_6_piece_2:
        with BuildLine():
            CenterArc((2.2 + FILLET_6_R, FILLET_6_R), FILLET_6_R, 180, 90)
            Line((2.2 + FILLET_6_R, 0), (2.2, 0))
            Line((2.2, 0), (2.2, FILLET_6_R))
        make_face()
    revolve(axis=Axis((2.3, 0, 0), (-1, 0, 0)), revolution_arc=73.024092575, mode=Mode.SUBTRACT)

    # 草图1<5> → 拉伸-薄壁5 (add)
    with BuildSketch(Plane(origin=(2, 0, 0), x_dir=(0, 0, -1), z_dir=(1, 0, 0)).offset(EXTRUDE_START)):
        with BuildLine():
            ThreePointArc((-1.1, 1.905255888), (0, 2.2), (1.1, 1.905255888))
            Line((1.1, 1.905255888), (1.2, 2.078460969))
            ThreePointArc((1.2, 2.078460969), (0, 2.4), (-1.2, 2.078460969))
            Line((-1.2, 2.078460969), (-1.1, 1.905255888))
        make_face()
        with BuildLine():
            ThreePointArc((2.2, 0), (1.905255888, -1.1), (1.1, -1.905255888))
            Line((1.1, -1.905255888), (1.2, -2.078460969))
            ThreePointArc((1.2, -2.078460969), (2.078460969, -1.2), (2.4, 0))
            Line((2.4, 0), (2.2, 0))
        make_face()
        with BuildLine():
            ThreePointArc((-1.1, -1.905255888), (-1.905255888, -1.1), (-2.2, 0))
            Line((-2.2, 0), (-2.4, 0))
            ThreePointArc((-2.4, 0), (-2.078460969, -1.2), (-1.2, -2.078460969))
            Line((-1.2, -2.078460969), (-1.1, -1.905255888))
        make_face()
    extrude(amount=EXTRUDE_5_DEPTH)

    # 圆角7
    # the kernel refuses this fillet: 0.1 mm, written as the material it takes off along each edge
    with BuildSketch(Plane(origin=(-0.3, 0, 0), x_dir=(0, 0.809331046346937, -0.5873527538191783), z_dir=(0, -0.5873527538191783, -0.809331046346937))) as fillet_7_piece_1:
        with BuildLine():
            CenterArc((2.4 - FILLET_7_R, FILLET_7_R), FILLET_7_R, 270, 90)
            Line((2.4 - FILLET_7_R, 0), (2.4, 0))
            Line((2.4, 0), (2.4, FILLET_7_R))
        make_face()
    revolve(axis=Axis((-0.3, 0, 0), (1, 0, 0)), revolution_arc=71.938751527, mode=Mode.SUBTRACT)
    with BuildSketch(Plane(origin=(-0.3, 0, 0), x_dir=(0, 0.8037317829196821, 0.5949917824010252), z_dir=(0, -0.5949917824010252, 0.8037317829196821))) as fillet_7_piece_2:
        with BuildLine():
            CenterArc((2.2 + FILLET_7_R, -FILLET_7_R), FILLET_7_R, 90, 90)
            Line((2.2 + FILLET_7_R, 0), (2.2, 0))
            Line((2.2, 0), (2.2, -FILLET_7_R))
        make_face()
    revolve(axis=Axis((-0.3, 0, 0), (-1, 0, 0)), revolution_arc=73.024092575, mode=Mode.SUBTRACT)

    # 圆角8
    # the kernel refuses this fillet: 0.1 mm, written as the material it takes off along each edge
    with BuildSketch(Plane(origin=(-0.3, 0, 0), x_dir=(0, 0.10399688261682512, 0.994577623117463), z_dir=(0, 0.994577623117463, -0.10399688261682512))) as fillet_8_piece_1:
        with BuildLine():
            CenterArc((2.4 - FILLET_8_R, FILLET_8_R), FILLET_8_R, 270, 90)
            Line((2.4 - FILLET_8_R, 0), (2.4, 0))
            Line((2.4, 0), (2.4, FILLET_8_R))
        make_face()
    revolve(axis=Axis((-0.3, 0, 0), (1, 0, 0)), revolution_arc=71.938751527, mode=Mode.SUBTRACT)
    with BuildSketch(Plane(origin=(-0.3, 0, 0), x_dir=(0, -0.9171438900620574, 0.39855625063701694), z_dir=(0, -0.39855625063701694, -0.9171438900620574))) as fillet_8_piece_2:
        with BuildLine():
            CenterArc((2.2 + FILLET_8_R, -FILLET_8_R), FILLET_8_R, 90, 90)
            Line((2.2 + FILLET_8_R, 0), (2.2, 0))
            Line((2.2, 0), (2.2, -FILLET_8_R))
        make_face()
    revolve(axis=Axis((-0.3, 0, 0), (-1, 0, 0)), revolution_arc=73.024092575, mode=Mode.SUBTRACT)

    # 圆角9
    # the kernel refuses this fillet: 0.1 mm, written as the material it takes off along each edge
    with BuildSketch(Plane(origin=(-0.3, 0, 0), x_dir=(0, -0.9133279289636526, -0.4072248692982359), z_dir=(0, -0.4072248692982359, 0.9133279289636526))) as fillet_9_piece_1:
        with BuildLine():
            CenterArc((2.4 - FILLET_9_R, FILLET_9_R), FILLET_9_R, 270, 90)
            Line((2.4 - FILLET_9_R, 0), (2.4, 0))
            Line((2.4, 0), (2.4, FILLET_9_R))
        make_face()
    revolve(axis=Axis((-0.3, 0, 0), (1, 0, 0)), revolution_arc=71.938751527, mode=Mode.SUBTRACT)
    with BuildSketch(Plane(origin=(-0.3, 0, 0), x_dir=(0, 0.11341210714236213, -0.9935480330379249), z_dir=(0, 0.9935480330379249, 0.11341210714236213))) as fillet_9_piece_2:
        with BuildLine():
            CenterArc((2.2 + FILLET_9_R, -FILLET_9_R), FILLET_9_R, 90, 90)
            Line((2.2 + FILLET_9_R, 0), (2.2, 0))
            Line((2.2, 0), (2.2, -FILLET_9_R))
        make_face()
    revolve(axis=Axis((-0.3, 0, 0), (-1, 0, 0)), revolution_arc=73.024092575, mode=Mode.SUBTRACT)


solid = part.part
